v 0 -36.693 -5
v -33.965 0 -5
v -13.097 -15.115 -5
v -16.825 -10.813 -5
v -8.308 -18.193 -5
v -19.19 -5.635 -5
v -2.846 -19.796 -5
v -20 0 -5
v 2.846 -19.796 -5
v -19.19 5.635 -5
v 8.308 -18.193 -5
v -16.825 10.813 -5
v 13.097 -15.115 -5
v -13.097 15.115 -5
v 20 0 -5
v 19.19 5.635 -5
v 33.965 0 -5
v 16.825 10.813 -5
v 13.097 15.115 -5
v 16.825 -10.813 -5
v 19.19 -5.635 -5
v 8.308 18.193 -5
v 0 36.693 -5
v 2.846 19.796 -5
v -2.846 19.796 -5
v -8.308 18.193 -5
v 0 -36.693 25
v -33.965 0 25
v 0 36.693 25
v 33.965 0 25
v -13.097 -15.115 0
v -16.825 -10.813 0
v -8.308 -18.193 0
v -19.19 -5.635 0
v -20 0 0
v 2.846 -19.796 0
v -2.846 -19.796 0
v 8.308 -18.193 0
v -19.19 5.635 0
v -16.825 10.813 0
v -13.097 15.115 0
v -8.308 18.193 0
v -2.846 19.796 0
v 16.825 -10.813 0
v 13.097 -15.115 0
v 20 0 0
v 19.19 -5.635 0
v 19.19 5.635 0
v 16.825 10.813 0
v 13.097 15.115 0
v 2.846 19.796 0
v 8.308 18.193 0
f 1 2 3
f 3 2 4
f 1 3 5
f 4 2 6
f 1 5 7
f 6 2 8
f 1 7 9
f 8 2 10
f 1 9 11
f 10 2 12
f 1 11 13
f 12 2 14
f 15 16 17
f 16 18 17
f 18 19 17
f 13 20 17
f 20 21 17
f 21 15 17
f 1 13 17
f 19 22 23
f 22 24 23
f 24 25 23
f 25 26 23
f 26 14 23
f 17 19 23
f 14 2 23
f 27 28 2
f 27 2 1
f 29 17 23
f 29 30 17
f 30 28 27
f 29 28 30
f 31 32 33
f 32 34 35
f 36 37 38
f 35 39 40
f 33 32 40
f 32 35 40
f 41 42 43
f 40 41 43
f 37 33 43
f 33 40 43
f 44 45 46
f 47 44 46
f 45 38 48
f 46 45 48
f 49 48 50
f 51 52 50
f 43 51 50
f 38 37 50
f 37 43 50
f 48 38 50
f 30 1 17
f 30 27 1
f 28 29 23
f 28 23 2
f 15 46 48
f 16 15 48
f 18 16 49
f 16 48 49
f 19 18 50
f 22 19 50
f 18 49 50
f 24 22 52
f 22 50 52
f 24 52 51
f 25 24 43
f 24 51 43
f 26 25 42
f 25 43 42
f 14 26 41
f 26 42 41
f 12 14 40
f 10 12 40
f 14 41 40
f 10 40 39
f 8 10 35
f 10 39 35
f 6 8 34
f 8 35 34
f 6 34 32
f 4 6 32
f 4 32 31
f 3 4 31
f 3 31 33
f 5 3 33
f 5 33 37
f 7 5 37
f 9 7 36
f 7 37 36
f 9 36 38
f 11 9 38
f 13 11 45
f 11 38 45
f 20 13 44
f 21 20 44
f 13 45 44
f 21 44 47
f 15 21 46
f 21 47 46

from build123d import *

# Parameters (mm, degrees)
F0_R      = 20
F1_DEPTH  = 25
F2_DEPTH  = 10
F3_DEPTH  = 15
F4_DEPTH  = 25
F5_DEPTH  = 5
F6_DEPTH  = 10
F7_DEPTH  = 10
F5_FACE_R = 20
F8_DEPTH  = 10


with BuildPart() as f1:
    # F0 (on Top) → F1 (new body)
    with BuildSketch(Plane.XY):
        Polygon((33.9652827231, 0), (0, 36.6927727154), (-33.9652827231, 0), (0, -36.6927727154), align=None)
        Circle(F0_R, mode=Mode.SUBTRACT)
    extrude(amount=F1_DEPTH)

    # F0 (on Top) → F2 (join)
    with BuildSketch(Plane.XY):
        Polygon((33.9652827231, 0), (0, 36.6927727154), (-33.9652827231, 0), (0, -36.6927727154), align=None)
        Circle(F0_R, mode=Mode.SUBTRACT)
    extrude(amount=F2_DEPTH)

    # F0 (on Top) → F3 (join)
    with BuildSketch(Plane.XY):
        Polygon((33.9652827231, 0), (0, 36.6927727154), (-33.9652827231, 0), (0, -36.6927727154), align=None)
        Circle(F0_R, mode=Mode.SUBTRACT)
        Circle(F0_R)
    extrude(amount=F3_DEPTH)

    # F0 (on Top) → F4 (join)
    with BuildSketch(Plane.XY):
        Circle(F0_R)
    extrude(amount=F4_DEPTH)

    # F0 (on Top) → F5 (join)
    with BuildSketch(Plane.XY):
        Polygon((33.9652827231, 0), (0, 36.6927727154), (-33.9652827231, 0), (0, -36.6927727154), align=None)
        Circle(F0_R, mode=Mode.SUBTRACT)
    extrude(amount=-F5_DEPTH)

    # F0 (on Top) → F6 (join)
    with BuildSketch(Plane.XY):
        Circle(F0_R)
    extrude(amount=F6_DEPTH)

    # F0 (on Top) → F7 (join)
    with BuildSketch(Plane.XY):
        Circle(F0_R)
    extrude(amount=F7_DEPTH)

    # F0 (on Top) + F5_face (on face) → F8 (join)
    with BuildSketch(Plane.XY):
        Circle(F0_R)
    with BuildSketch(Plane(origin=(0, 0, -5), x_dir=(1, 0, 0), z_dir=(0, 0, -1))):
        Polygon((0, 36.6927727154), (-33.9652827231, 0), (0, -36.6927727154), (33.9652827231, 0), align=None)
        Circle(F5_FACE_R, mode=Mode.SUBTRACT)
    extrude(amount=F8_DEPTH, dir=(0, 0, 1))


solid = f1.part
